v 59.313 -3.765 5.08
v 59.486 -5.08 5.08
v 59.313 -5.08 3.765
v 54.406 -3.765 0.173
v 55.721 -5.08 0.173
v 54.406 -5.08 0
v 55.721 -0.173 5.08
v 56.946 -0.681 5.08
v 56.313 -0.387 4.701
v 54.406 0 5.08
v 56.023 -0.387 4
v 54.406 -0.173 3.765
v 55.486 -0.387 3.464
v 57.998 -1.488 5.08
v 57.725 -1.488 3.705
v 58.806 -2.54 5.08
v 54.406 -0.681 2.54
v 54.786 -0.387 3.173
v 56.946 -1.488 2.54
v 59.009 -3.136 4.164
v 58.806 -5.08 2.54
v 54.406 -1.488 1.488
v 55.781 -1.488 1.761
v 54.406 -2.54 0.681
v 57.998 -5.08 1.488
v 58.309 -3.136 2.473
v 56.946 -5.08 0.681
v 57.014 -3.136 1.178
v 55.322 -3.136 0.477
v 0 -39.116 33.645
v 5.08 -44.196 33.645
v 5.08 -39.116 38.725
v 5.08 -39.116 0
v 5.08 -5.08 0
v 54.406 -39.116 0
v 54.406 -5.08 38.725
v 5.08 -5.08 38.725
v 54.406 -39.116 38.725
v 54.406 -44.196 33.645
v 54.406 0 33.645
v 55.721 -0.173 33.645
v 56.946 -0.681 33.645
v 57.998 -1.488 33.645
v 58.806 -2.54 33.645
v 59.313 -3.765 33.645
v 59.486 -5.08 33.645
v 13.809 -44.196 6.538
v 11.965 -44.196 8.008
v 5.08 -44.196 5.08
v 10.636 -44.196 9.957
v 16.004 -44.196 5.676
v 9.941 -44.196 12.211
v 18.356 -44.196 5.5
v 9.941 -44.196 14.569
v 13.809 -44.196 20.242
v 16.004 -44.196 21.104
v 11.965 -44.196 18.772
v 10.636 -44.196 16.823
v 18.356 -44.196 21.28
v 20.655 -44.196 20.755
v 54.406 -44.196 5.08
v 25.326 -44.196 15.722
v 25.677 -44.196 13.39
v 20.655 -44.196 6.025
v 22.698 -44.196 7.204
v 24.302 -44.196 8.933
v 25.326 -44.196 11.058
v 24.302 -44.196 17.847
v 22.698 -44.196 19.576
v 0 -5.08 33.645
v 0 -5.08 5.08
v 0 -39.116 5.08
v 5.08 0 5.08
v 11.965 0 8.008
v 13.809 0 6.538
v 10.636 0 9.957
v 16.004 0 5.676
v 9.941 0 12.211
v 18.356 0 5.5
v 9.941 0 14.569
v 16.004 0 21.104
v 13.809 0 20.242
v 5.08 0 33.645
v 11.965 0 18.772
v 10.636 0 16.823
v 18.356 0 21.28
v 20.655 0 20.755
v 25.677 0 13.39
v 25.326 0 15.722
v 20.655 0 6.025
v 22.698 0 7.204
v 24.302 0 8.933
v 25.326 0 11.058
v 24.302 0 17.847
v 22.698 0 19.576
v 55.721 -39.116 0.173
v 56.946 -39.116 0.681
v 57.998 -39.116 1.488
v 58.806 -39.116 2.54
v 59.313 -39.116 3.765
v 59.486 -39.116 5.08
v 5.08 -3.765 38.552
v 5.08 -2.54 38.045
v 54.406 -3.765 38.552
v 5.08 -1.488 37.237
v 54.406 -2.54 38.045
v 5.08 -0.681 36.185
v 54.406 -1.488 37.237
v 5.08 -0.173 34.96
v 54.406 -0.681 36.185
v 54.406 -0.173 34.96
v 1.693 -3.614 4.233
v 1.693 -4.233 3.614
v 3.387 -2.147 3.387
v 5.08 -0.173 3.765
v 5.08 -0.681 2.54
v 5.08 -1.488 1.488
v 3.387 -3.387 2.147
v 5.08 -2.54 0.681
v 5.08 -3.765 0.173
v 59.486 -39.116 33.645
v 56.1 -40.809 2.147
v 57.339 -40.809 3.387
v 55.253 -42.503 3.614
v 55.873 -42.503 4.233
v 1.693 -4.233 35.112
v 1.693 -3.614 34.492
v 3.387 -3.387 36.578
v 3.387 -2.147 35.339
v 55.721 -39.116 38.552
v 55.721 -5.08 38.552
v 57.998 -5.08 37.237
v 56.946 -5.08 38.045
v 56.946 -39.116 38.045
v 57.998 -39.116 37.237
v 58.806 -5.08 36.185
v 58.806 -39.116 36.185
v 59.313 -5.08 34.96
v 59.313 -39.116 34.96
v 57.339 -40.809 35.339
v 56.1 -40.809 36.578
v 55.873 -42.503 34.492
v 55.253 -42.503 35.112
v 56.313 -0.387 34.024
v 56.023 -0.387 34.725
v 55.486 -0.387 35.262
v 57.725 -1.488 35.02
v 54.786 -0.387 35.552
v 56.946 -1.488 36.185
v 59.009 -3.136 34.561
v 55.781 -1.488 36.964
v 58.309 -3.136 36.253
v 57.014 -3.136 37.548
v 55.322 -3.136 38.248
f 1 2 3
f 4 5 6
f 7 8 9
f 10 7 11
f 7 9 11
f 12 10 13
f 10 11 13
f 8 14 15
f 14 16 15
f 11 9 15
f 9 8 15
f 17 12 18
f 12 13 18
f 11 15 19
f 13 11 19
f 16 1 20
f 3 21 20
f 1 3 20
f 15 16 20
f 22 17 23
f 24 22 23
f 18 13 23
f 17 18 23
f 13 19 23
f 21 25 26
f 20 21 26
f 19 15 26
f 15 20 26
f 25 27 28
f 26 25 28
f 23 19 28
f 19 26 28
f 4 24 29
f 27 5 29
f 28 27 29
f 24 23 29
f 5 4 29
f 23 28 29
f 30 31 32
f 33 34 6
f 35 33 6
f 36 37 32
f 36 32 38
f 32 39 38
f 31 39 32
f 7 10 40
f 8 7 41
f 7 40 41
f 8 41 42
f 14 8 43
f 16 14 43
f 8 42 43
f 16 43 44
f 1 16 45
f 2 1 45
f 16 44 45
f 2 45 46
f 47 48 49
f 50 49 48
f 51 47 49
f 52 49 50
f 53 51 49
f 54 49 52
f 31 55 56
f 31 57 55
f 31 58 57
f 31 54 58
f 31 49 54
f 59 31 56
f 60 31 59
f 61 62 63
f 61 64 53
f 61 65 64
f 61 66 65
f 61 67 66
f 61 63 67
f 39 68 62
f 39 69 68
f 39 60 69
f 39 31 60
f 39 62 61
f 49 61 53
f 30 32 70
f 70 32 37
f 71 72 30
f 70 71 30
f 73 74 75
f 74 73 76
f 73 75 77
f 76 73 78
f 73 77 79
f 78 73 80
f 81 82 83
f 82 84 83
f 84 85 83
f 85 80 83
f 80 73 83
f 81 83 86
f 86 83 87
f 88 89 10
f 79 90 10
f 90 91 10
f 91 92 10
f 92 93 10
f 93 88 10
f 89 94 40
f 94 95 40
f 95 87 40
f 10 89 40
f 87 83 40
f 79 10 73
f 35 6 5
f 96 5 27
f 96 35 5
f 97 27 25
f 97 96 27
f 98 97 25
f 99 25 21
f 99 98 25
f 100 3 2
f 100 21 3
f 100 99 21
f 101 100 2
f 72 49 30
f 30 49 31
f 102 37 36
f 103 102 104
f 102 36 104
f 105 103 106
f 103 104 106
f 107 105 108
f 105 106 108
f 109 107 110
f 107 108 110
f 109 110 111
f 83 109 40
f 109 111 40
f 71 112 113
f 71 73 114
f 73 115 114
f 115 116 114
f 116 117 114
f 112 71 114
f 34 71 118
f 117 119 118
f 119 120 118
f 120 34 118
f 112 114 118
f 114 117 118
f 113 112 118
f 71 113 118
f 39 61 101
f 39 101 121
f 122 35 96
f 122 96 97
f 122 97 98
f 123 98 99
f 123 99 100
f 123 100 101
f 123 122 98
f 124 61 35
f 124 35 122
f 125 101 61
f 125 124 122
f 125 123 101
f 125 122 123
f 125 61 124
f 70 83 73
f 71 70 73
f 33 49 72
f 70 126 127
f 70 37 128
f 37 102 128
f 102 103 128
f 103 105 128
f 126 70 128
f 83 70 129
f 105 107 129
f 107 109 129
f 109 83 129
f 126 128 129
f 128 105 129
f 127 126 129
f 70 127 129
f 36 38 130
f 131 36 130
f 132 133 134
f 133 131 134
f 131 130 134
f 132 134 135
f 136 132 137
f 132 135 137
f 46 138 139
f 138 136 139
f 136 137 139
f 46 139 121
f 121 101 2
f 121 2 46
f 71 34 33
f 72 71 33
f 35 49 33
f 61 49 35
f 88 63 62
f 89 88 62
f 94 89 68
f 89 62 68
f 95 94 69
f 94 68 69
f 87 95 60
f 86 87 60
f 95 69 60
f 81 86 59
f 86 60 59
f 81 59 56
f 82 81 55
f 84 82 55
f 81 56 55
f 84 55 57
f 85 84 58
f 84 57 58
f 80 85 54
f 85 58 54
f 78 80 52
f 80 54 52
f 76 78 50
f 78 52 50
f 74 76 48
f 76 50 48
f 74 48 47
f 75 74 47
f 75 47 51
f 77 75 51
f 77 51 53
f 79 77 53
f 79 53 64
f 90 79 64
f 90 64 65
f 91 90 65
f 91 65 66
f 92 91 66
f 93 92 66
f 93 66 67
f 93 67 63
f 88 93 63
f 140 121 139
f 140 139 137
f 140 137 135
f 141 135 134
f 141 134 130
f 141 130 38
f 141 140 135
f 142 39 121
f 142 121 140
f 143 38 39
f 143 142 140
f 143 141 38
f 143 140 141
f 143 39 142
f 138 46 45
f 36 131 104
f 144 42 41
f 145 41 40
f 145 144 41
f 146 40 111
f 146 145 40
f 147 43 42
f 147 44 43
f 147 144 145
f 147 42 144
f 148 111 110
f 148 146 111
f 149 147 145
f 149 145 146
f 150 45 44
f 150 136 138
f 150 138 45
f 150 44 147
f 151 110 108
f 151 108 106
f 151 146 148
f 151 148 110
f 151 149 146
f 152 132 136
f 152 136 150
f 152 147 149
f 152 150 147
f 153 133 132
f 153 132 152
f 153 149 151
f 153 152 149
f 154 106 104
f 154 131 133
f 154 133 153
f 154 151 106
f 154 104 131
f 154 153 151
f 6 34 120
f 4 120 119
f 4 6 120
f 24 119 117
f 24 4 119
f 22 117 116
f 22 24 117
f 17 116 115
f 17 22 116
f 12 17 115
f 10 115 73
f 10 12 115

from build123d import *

# Parameters (mm, degrees)
F0_W     = 59.4862774014
F0_H     = 38.7252047658
F1_DEPTH = 44.196
F2_R     = 7.9122216874
F3_DEPTH = 70.104
F4_R     = 5.08
F5_SIZE  = 5.07999


# Not quite as in the source:
# - a fillet or chamfer is up to 0.001 mm smaller than in the source, because OpenCascade refuses the exact size


with BuildPart() as f1:
    # F0 (on Front) → F1 (new body)
    with BuildSketch(Plane.XZ):
        with Locations((29.7431387007, 19.3626023829)):
            Rectangle(F0_W, F0_H)
    extrude(amount=F1_DEPTH)

    # F2 (on face) → F3 (cut)
    with BuildSketch(Plane.XZ.offset(44.196)):
        with Locations((17.7647974342, 13.3899012581)):
            Circle(F2_R)
    extrude(amount=-F3_DEPTH, mode=Mode.SUBTRACT)

    # F4
    f4_edges = [f1.edges().sort_by_distance(p)[0] for p in [
        (59.486277, -22.098, 38.725205),
        (59.486277, -22.098, 0),
        (59.486277, 0, 19.362602),
        (29.743139, 0, 38.725205),
        (29.743139, 0, 0),
    ]]
    fillet(f4_edges, radius=F4_R)

    # F5 (size 5.08 in the source; OpenCascade refuses exactly that, so slightly less here)
    f5_edges = [f1.edges().sort_by_distance(p)[0] for p in [
        (0, -44.196, 19.362602),
        (27.203139, -44.196, 0),
        (0, -24.638, 0),
    ]]
    chamfer(f5_edges, length=F5_SIZE)


solid = f1.part
